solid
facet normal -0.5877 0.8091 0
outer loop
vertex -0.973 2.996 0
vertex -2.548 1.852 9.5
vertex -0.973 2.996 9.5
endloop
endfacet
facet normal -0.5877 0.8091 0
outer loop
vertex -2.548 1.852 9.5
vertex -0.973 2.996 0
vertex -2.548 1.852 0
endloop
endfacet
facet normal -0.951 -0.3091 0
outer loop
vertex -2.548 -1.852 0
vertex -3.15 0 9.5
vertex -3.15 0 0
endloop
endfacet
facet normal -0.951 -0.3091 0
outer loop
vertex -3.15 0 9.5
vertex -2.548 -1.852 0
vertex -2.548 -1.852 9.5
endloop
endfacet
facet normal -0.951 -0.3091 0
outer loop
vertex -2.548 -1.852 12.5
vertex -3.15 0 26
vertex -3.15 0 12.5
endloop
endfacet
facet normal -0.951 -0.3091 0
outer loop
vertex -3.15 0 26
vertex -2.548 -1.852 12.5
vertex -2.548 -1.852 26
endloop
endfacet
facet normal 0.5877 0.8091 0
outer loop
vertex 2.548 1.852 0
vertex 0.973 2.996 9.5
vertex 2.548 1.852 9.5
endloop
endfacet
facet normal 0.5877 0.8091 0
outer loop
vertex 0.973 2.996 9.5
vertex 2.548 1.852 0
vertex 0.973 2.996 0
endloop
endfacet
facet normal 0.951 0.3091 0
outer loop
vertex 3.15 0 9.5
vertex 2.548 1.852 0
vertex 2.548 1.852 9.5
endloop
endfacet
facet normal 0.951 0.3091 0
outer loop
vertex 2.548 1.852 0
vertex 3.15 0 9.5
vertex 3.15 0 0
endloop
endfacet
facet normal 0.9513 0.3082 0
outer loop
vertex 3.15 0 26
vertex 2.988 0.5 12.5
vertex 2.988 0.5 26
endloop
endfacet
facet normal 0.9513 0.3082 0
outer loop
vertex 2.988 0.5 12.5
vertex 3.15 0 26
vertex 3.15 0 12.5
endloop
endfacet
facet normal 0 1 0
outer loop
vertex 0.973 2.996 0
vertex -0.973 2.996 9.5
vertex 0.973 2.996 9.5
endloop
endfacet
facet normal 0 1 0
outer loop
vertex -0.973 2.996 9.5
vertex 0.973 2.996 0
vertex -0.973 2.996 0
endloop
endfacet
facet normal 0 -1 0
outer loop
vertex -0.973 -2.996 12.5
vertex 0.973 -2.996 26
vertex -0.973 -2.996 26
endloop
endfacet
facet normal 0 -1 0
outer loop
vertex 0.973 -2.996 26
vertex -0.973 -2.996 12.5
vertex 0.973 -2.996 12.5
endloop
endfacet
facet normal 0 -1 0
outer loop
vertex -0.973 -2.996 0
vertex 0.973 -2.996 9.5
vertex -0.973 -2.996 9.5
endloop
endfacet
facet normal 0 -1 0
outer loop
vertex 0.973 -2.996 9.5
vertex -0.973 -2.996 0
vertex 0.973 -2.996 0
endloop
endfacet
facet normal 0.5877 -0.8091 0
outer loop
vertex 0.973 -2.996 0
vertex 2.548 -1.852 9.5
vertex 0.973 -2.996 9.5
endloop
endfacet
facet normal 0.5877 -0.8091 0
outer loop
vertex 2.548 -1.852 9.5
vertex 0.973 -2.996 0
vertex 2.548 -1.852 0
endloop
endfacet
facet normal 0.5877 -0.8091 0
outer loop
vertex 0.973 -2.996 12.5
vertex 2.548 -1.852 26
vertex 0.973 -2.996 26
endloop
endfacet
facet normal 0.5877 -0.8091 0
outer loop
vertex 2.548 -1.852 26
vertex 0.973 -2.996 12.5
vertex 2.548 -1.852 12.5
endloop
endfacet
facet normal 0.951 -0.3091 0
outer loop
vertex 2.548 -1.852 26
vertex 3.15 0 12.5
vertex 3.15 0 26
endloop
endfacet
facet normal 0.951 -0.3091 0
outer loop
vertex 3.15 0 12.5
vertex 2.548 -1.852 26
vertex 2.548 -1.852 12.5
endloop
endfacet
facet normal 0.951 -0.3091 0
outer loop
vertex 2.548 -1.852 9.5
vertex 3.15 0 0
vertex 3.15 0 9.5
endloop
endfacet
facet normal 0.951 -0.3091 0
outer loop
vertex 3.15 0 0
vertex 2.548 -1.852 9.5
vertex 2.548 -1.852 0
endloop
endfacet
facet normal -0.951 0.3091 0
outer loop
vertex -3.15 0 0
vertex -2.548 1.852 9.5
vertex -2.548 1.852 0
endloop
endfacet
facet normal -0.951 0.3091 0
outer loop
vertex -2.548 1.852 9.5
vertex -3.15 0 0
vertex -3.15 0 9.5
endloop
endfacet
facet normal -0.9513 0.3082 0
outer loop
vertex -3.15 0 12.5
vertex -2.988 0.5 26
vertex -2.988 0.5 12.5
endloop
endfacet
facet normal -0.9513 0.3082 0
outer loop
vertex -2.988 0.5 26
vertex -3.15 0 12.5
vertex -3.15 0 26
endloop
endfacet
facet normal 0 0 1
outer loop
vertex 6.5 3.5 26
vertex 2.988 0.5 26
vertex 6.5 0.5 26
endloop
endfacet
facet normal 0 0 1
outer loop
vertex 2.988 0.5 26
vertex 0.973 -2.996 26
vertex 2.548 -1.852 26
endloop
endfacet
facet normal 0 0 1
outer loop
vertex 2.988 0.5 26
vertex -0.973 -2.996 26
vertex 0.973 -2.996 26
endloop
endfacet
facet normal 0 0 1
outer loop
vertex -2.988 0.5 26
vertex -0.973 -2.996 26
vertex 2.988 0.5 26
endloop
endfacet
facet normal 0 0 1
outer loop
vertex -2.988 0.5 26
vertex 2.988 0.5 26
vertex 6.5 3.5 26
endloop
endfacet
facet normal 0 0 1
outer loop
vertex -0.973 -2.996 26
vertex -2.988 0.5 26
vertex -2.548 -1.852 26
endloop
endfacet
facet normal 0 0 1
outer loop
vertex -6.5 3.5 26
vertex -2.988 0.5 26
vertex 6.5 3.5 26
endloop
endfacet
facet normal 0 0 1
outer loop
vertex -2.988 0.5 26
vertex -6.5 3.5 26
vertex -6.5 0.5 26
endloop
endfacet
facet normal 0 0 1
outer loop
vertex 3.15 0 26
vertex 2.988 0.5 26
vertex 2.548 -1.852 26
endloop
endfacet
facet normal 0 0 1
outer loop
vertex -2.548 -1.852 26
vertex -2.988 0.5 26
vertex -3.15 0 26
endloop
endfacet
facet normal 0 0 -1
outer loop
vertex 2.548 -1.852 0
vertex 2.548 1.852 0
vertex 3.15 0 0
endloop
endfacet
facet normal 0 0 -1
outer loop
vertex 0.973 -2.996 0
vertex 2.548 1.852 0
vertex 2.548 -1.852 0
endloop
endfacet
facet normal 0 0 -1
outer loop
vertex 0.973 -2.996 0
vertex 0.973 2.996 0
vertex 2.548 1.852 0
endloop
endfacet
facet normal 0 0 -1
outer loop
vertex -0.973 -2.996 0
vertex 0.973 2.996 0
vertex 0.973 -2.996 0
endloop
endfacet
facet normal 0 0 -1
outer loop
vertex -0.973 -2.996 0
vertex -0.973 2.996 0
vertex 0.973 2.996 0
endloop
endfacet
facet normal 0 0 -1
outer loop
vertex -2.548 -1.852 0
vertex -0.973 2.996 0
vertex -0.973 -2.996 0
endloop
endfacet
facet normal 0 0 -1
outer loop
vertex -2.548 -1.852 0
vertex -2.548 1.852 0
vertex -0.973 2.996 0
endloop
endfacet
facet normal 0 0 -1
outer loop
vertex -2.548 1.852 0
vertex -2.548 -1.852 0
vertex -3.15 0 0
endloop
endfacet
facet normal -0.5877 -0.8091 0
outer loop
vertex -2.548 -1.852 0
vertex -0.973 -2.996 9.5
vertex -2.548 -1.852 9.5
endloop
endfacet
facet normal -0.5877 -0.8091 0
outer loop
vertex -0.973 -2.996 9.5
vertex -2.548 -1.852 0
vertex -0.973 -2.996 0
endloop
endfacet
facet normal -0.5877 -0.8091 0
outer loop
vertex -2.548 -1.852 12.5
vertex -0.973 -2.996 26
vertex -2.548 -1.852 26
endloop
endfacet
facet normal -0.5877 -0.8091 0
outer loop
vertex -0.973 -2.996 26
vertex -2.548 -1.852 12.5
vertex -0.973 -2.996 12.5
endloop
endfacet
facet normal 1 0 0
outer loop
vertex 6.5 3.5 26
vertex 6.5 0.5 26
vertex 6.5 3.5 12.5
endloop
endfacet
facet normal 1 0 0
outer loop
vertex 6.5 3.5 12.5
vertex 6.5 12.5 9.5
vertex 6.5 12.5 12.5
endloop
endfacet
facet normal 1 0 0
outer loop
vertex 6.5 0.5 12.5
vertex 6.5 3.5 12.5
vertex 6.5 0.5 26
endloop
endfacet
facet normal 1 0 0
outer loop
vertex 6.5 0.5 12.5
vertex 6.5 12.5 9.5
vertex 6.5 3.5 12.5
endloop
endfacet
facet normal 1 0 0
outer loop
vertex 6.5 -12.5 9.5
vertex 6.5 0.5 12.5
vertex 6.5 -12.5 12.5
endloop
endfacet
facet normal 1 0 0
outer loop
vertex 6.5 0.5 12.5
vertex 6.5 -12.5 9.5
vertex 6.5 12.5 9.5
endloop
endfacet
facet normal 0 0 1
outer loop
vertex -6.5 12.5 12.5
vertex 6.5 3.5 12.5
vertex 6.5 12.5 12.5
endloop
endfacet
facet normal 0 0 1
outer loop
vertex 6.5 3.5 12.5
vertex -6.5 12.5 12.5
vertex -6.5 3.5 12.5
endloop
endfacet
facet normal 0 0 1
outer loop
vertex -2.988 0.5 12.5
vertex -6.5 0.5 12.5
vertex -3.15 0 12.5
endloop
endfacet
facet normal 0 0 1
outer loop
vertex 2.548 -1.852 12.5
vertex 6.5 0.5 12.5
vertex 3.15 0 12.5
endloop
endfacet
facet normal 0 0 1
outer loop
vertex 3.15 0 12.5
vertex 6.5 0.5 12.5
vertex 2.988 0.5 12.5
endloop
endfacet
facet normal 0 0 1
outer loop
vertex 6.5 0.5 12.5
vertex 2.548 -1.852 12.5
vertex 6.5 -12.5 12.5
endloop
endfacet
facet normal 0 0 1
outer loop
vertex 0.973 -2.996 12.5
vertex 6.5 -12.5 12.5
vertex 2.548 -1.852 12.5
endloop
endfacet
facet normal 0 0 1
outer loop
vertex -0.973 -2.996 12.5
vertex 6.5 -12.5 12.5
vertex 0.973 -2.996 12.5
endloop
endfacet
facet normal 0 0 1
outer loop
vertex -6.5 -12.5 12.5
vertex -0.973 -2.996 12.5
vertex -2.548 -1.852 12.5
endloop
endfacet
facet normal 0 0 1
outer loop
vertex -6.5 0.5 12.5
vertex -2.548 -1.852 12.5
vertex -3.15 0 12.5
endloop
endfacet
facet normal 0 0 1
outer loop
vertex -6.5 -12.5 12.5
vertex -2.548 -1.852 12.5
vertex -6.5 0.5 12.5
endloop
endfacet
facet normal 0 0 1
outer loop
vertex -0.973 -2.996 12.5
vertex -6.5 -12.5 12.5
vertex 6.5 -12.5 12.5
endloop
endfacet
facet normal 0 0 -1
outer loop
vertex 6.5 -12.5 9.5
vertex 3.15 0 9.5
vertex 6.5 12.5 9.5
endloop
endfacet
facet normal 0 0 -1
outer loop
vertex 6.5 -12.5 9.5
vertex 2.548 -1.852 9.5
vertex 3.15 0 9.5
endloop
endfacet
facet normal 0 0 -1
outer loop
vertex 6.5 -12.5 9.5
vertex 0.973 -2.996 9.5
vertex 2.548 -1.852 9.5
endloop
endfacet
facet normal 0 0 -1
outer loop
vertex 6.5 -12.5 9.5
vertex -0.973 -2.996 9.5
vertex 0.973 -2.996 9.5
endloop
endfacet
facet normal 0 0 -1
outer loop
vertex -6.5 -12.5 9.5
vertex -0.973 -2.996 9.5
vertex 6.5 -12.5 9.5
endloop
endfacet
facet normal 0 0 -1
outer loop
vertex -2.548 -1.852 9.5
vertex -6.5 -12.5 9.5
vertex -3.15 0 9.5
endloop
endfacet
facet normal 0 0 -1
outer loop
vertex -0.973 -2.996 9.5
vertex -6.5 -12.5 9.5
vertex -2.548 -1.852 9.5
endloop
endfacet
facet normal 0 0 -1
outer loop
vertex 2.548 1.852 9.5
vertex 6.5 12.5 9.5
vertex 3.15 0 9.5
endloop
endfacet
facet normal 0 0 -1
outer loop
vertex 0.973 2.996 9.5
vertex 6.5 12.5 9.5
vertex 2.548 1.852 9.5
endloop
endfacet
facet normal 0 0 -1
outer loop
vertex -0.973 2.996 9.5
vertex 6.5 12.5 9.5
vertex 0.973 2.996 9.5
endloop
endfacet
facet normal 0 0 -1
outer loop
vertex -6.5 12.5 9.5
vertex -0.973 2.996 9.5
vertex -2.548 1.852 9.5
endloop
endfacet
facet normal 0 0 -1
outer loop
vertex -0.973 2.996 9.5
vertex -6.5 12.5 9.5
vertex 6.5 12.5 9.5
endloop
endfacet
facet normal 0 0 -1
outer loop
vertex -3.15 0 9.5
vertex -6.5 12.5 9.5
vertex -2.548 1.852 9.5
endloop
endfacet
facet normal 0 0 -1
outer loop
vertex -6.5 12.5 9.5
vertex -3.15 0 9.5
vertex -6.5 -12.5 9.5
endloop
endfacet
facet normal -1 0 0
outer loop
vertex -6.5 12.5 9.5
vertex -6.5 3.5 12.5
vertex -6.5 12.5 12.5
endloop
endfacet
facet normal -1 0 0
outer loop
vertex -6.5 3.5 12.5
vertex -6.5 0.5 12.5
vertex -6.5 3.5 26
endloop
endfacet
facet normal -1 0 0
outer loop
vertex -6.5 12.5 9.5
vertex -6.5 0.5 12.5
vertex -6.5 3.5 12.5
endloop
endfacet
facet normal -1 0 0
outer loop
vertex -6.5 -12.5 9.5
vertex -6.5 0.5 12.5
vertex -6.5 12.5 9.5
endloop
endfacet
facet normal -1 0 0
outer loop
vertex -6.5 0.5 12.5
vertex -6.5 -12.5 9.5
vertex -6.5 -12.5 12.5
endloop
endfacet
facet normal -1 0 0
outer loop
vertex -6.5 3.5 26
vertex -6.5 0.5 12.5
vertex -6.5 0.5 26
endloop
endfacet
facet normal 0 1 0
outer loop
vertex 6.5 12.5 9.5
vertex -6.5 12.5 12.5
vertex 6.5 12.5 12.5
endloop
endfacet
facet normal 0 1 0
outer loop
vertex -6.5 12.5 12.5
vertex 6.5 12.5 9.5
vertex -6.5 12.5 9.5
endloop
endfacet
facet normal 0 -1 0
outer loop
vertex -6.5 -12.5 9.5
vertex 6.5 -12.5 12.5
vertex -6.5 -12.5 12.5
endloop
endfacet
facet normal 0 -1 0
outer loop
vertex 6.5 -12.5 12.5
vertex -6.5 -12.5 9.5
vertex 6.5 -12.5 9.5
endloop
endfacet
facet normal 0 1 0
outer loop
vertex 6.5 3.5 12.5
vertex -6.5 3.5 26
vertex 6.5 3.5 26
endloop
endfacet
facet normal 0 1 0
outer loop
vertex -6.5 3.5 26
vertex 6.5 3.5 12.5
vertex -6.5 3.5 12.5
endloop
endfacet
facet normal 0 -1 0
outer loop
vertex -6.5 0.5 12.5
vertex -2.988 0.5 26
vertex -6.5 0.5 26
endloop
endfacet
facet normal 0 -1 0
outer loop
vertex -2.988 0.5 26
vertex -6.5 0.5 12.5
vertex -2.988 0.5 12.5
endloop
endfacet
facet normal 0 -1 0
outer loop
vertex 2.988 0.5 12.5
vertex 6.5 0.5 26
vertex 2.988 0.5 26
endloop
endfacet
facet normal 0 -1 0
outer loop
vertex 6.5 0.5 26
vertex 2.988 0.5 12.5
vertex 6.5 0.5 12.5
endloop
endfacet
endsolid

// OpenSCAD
// kitch1.scad  
// kitchen cabinet bracket


cylinder(r=6.3/2,h=26);

color("green")
translate([0,0,11])
cube([13,25,3],center=true);

color("cyan")
translate([0,2,18.5])
cube([13,3,15],center=true);
